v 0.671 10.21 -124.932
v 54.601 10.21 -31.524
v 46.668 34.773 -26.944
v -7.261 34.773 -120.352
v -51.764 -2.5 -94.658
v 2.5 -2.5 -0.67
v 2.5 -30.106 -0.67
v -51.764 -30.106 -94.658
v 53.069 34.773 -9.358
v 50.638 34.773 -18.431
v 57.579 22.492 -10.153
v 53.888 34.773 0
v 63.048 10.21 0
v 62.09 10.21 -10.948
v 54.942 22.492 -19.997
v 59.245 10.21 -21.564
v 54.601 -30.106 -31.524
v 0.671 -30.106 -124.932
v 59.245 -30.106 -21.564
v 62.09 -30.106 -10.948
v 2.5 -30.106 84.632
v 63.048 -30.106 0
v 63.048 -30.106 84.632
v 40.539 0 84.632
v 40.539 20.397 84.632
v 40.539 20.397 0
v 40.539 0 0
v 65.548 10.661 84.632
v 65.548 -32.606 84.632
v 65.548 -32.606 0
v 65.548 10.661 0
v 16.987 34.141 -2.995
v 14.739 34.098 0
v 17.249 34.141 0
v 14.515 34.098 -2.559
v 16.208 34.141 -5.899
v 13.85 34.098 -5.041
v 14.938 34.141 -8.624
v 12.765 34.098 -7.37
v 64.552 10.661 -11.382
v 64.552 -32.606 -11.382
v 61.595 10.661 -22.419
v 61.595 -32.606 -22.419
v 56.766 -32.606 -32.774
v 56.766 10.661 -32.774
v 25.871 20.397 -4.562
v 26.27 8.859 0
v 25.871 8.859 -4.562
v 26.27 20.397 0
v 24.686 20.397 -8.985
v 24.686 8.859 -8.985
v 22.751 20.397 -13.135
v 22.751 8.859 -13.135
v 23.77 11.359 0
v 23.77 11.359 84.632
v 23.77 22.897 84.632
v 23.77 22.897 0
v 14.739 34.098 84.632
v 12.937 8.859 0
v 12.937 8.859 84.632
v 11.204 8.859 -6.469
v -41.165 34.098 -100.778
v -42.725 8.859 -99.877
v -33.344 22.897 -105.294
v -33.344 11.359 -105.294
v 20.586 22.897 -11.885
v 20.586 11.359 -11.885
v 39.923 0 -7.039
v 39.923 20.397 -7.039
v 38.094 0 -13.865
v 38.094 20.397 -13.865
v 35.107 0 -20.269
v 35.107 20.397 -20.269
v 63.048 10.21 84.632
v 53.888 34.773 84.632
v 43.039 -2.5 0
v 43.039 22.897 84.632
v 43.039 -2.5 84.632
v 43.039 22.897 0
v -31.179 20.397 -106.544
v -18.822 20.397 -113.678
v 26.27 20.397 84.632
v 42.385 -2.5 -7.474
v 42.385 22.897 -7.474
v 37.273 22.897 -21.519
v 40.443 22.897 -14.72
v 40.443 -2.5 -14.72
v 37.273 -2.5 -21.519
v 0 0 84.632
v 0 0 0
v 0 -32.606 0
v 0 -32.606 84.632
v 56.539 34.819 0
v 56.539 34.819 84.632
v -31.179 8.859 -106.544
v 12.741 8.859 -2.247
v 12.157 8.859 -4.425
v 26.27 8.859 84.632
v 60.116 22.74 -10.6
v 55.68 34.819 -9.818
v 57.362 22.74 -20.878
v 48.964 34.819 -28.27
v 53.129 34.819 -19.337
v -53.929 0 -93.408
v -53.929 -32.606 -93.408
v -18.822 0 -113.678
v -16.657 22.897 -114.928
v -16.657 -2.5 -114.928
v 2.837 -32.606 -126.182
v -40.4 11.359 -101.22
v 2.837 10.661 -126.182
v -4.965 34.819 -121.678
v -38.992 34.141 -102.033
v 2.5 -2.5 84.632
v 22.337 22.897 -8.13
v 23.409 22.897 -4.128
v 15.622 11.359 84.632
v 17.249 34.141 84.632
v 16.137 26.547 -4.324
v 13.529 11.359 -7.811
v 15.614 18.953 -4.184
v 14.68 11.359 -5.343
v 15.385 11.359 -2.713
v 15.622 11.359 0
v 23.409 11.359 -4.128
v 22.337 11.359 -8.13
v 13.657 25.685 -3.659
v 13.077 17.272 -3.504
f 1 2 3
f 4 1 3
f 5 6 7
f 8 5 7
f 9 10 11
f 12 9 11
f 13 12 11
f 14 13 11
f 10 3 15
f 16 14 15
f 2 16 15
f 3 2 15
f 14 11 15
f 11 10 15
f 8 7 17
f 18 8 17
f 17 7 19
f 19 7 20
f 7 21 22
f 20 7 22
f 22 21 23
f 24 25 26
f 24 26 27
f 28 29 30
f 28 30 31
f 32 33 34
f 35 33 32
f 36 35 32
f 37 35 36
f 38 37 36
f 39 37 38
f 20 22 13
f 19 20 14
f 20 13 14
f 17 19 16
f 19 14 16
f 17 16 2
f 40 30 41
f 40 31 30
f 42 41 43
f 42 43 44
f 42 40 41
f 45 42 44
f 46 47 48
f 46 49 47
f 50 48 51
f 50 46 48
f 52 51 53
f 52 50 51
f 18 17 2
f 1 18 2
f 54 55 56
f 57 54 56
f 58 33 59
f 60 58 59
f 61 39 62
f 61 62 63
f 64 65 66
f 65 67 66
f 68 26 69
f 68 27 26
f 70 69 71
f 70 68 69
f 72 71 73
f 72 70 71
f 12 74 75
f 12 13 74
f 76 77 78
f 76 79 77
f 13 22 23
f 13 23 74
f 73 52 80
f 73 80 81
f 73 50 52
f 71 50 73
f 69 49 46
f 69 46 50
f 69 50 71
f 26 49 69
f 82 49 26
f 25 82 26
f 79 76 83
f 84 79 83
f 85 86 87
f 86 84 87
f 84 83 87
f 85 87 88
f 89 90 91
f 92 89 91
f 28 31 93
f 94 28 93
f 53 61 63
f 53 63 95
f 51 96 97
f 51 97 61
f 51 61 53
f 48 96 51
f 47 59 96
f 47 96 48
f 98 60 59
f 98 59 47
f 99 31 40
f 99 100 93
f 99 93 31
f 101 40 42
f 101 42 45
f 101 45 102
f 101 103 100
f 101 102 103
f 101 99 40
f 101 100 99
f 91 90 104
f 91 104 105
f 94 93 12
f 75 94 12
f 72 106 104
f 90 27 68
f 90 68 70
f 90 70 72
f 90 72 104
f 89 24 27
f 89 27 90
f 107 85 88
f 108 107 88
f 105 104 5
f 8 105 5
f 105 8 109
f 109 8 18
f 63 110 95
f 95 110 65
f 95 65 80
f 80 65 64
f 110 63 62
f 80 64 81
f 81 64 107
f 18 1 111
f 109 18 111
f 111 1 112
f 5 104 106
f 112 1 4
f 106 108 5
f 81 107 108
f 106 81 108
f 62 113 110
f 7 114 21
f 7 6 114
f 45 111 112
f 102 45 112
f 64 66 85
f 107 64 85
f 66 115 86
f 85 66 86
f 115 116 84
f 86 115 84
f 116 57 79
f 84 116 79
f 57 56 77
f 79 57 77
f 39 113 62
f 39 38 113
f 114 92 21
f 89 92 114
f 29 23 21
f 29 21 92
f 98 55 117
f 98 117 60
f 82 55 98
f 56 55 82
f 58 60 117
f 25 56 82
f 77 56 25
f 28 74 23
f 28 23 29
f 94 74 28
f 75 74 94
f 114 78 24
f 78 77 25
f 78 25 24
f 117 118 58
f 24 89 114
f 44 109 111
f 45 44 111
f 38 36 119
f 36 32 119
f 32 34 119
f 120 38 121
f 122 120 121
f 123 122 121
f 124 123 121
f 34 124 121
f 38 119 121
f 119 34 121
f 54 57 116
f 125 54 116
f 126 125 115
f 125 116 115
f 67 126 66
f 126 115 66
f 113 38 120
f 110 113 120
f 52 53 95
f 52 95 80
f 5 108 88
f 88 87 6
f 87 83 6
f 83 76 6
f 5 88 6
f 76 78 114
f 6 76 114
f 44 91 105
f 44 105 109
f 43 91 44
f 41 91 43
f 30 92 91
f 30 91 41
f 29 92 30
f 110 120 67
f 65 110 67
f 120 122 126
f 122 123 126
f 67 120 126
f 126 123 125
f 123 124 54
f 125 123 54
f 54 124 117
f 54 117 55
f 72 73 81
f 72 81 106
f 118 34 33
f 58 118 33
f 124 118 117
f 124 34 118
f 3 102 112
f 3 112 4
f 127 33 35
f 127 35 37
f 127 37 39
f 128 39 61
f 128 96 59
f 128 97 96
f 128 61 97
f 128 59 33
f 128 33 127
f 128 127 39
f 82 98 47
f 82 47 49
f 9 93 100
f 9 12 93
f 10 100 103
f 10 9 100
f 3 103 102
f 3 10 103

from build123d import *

# Parameters (mm, degrees)
F1_ANGLE = 30
F2_DEPTH = 84.6318360418
F3_DEPTH = 107.8587528318
F4_T     = -2.5


with BuildPart() as f1:
    # F0 (on Top) → F1 (revolve)
    with BuildSketch(Plane.XY):
        Polygon((40.5386388302, 0), (0, 0), (0, -32.6061099768), (65.5476081002, -32.6061099768), (65.5476081002, 10.6613785028), (56.5390067924, 34.8190441728), (14.7391783822, 34.0979024768), (12.93744918, 8.8585615158), (26.2701737512, 8.8585615158), (26.2701737512, 20.3965455294), (40.5386388302, 20.3965455294), align=None)
    revolve(axis=Axis((0, 33.5853546858, 0), (0, 1, 0)), revolution_arc=F1_ANGLE)

    # F2 (add): a face of the model
    f2_faces = [f1.faces().sort_by_distance(p)[0] for p in [
        (35.8528851523, -3.0790957236, 0),
    ]]
    extrude(f2_faces, amount=F2_DEPTH)

    # F3 (add): a face of the model
    f3_faces = [f1.faces().sort_by_distance(p)[0] for p in [
        (31.0495093409, -3.0790957236, -17.9264425762),
    ]]
    extrude(f3_faces, amount=F3_DEPTH)

    # F4
    f4_openings = [f1.faces().sort_by_distance(p)[0] for p in [
        (3.899671, 34.458473, -64.523756),
        (34.42472, 34.458473, -9.224076),
        (35.639093, 34.458473, 42.315918),
        (35.852885, -3.079096, 84.631836),
        (-22.879867, -3.079096, -111.334863),
    ]]
    offset(amount=F4_T, openings=f4_openings, kind=Kind.INTERSECTION)


solid = f1.part
